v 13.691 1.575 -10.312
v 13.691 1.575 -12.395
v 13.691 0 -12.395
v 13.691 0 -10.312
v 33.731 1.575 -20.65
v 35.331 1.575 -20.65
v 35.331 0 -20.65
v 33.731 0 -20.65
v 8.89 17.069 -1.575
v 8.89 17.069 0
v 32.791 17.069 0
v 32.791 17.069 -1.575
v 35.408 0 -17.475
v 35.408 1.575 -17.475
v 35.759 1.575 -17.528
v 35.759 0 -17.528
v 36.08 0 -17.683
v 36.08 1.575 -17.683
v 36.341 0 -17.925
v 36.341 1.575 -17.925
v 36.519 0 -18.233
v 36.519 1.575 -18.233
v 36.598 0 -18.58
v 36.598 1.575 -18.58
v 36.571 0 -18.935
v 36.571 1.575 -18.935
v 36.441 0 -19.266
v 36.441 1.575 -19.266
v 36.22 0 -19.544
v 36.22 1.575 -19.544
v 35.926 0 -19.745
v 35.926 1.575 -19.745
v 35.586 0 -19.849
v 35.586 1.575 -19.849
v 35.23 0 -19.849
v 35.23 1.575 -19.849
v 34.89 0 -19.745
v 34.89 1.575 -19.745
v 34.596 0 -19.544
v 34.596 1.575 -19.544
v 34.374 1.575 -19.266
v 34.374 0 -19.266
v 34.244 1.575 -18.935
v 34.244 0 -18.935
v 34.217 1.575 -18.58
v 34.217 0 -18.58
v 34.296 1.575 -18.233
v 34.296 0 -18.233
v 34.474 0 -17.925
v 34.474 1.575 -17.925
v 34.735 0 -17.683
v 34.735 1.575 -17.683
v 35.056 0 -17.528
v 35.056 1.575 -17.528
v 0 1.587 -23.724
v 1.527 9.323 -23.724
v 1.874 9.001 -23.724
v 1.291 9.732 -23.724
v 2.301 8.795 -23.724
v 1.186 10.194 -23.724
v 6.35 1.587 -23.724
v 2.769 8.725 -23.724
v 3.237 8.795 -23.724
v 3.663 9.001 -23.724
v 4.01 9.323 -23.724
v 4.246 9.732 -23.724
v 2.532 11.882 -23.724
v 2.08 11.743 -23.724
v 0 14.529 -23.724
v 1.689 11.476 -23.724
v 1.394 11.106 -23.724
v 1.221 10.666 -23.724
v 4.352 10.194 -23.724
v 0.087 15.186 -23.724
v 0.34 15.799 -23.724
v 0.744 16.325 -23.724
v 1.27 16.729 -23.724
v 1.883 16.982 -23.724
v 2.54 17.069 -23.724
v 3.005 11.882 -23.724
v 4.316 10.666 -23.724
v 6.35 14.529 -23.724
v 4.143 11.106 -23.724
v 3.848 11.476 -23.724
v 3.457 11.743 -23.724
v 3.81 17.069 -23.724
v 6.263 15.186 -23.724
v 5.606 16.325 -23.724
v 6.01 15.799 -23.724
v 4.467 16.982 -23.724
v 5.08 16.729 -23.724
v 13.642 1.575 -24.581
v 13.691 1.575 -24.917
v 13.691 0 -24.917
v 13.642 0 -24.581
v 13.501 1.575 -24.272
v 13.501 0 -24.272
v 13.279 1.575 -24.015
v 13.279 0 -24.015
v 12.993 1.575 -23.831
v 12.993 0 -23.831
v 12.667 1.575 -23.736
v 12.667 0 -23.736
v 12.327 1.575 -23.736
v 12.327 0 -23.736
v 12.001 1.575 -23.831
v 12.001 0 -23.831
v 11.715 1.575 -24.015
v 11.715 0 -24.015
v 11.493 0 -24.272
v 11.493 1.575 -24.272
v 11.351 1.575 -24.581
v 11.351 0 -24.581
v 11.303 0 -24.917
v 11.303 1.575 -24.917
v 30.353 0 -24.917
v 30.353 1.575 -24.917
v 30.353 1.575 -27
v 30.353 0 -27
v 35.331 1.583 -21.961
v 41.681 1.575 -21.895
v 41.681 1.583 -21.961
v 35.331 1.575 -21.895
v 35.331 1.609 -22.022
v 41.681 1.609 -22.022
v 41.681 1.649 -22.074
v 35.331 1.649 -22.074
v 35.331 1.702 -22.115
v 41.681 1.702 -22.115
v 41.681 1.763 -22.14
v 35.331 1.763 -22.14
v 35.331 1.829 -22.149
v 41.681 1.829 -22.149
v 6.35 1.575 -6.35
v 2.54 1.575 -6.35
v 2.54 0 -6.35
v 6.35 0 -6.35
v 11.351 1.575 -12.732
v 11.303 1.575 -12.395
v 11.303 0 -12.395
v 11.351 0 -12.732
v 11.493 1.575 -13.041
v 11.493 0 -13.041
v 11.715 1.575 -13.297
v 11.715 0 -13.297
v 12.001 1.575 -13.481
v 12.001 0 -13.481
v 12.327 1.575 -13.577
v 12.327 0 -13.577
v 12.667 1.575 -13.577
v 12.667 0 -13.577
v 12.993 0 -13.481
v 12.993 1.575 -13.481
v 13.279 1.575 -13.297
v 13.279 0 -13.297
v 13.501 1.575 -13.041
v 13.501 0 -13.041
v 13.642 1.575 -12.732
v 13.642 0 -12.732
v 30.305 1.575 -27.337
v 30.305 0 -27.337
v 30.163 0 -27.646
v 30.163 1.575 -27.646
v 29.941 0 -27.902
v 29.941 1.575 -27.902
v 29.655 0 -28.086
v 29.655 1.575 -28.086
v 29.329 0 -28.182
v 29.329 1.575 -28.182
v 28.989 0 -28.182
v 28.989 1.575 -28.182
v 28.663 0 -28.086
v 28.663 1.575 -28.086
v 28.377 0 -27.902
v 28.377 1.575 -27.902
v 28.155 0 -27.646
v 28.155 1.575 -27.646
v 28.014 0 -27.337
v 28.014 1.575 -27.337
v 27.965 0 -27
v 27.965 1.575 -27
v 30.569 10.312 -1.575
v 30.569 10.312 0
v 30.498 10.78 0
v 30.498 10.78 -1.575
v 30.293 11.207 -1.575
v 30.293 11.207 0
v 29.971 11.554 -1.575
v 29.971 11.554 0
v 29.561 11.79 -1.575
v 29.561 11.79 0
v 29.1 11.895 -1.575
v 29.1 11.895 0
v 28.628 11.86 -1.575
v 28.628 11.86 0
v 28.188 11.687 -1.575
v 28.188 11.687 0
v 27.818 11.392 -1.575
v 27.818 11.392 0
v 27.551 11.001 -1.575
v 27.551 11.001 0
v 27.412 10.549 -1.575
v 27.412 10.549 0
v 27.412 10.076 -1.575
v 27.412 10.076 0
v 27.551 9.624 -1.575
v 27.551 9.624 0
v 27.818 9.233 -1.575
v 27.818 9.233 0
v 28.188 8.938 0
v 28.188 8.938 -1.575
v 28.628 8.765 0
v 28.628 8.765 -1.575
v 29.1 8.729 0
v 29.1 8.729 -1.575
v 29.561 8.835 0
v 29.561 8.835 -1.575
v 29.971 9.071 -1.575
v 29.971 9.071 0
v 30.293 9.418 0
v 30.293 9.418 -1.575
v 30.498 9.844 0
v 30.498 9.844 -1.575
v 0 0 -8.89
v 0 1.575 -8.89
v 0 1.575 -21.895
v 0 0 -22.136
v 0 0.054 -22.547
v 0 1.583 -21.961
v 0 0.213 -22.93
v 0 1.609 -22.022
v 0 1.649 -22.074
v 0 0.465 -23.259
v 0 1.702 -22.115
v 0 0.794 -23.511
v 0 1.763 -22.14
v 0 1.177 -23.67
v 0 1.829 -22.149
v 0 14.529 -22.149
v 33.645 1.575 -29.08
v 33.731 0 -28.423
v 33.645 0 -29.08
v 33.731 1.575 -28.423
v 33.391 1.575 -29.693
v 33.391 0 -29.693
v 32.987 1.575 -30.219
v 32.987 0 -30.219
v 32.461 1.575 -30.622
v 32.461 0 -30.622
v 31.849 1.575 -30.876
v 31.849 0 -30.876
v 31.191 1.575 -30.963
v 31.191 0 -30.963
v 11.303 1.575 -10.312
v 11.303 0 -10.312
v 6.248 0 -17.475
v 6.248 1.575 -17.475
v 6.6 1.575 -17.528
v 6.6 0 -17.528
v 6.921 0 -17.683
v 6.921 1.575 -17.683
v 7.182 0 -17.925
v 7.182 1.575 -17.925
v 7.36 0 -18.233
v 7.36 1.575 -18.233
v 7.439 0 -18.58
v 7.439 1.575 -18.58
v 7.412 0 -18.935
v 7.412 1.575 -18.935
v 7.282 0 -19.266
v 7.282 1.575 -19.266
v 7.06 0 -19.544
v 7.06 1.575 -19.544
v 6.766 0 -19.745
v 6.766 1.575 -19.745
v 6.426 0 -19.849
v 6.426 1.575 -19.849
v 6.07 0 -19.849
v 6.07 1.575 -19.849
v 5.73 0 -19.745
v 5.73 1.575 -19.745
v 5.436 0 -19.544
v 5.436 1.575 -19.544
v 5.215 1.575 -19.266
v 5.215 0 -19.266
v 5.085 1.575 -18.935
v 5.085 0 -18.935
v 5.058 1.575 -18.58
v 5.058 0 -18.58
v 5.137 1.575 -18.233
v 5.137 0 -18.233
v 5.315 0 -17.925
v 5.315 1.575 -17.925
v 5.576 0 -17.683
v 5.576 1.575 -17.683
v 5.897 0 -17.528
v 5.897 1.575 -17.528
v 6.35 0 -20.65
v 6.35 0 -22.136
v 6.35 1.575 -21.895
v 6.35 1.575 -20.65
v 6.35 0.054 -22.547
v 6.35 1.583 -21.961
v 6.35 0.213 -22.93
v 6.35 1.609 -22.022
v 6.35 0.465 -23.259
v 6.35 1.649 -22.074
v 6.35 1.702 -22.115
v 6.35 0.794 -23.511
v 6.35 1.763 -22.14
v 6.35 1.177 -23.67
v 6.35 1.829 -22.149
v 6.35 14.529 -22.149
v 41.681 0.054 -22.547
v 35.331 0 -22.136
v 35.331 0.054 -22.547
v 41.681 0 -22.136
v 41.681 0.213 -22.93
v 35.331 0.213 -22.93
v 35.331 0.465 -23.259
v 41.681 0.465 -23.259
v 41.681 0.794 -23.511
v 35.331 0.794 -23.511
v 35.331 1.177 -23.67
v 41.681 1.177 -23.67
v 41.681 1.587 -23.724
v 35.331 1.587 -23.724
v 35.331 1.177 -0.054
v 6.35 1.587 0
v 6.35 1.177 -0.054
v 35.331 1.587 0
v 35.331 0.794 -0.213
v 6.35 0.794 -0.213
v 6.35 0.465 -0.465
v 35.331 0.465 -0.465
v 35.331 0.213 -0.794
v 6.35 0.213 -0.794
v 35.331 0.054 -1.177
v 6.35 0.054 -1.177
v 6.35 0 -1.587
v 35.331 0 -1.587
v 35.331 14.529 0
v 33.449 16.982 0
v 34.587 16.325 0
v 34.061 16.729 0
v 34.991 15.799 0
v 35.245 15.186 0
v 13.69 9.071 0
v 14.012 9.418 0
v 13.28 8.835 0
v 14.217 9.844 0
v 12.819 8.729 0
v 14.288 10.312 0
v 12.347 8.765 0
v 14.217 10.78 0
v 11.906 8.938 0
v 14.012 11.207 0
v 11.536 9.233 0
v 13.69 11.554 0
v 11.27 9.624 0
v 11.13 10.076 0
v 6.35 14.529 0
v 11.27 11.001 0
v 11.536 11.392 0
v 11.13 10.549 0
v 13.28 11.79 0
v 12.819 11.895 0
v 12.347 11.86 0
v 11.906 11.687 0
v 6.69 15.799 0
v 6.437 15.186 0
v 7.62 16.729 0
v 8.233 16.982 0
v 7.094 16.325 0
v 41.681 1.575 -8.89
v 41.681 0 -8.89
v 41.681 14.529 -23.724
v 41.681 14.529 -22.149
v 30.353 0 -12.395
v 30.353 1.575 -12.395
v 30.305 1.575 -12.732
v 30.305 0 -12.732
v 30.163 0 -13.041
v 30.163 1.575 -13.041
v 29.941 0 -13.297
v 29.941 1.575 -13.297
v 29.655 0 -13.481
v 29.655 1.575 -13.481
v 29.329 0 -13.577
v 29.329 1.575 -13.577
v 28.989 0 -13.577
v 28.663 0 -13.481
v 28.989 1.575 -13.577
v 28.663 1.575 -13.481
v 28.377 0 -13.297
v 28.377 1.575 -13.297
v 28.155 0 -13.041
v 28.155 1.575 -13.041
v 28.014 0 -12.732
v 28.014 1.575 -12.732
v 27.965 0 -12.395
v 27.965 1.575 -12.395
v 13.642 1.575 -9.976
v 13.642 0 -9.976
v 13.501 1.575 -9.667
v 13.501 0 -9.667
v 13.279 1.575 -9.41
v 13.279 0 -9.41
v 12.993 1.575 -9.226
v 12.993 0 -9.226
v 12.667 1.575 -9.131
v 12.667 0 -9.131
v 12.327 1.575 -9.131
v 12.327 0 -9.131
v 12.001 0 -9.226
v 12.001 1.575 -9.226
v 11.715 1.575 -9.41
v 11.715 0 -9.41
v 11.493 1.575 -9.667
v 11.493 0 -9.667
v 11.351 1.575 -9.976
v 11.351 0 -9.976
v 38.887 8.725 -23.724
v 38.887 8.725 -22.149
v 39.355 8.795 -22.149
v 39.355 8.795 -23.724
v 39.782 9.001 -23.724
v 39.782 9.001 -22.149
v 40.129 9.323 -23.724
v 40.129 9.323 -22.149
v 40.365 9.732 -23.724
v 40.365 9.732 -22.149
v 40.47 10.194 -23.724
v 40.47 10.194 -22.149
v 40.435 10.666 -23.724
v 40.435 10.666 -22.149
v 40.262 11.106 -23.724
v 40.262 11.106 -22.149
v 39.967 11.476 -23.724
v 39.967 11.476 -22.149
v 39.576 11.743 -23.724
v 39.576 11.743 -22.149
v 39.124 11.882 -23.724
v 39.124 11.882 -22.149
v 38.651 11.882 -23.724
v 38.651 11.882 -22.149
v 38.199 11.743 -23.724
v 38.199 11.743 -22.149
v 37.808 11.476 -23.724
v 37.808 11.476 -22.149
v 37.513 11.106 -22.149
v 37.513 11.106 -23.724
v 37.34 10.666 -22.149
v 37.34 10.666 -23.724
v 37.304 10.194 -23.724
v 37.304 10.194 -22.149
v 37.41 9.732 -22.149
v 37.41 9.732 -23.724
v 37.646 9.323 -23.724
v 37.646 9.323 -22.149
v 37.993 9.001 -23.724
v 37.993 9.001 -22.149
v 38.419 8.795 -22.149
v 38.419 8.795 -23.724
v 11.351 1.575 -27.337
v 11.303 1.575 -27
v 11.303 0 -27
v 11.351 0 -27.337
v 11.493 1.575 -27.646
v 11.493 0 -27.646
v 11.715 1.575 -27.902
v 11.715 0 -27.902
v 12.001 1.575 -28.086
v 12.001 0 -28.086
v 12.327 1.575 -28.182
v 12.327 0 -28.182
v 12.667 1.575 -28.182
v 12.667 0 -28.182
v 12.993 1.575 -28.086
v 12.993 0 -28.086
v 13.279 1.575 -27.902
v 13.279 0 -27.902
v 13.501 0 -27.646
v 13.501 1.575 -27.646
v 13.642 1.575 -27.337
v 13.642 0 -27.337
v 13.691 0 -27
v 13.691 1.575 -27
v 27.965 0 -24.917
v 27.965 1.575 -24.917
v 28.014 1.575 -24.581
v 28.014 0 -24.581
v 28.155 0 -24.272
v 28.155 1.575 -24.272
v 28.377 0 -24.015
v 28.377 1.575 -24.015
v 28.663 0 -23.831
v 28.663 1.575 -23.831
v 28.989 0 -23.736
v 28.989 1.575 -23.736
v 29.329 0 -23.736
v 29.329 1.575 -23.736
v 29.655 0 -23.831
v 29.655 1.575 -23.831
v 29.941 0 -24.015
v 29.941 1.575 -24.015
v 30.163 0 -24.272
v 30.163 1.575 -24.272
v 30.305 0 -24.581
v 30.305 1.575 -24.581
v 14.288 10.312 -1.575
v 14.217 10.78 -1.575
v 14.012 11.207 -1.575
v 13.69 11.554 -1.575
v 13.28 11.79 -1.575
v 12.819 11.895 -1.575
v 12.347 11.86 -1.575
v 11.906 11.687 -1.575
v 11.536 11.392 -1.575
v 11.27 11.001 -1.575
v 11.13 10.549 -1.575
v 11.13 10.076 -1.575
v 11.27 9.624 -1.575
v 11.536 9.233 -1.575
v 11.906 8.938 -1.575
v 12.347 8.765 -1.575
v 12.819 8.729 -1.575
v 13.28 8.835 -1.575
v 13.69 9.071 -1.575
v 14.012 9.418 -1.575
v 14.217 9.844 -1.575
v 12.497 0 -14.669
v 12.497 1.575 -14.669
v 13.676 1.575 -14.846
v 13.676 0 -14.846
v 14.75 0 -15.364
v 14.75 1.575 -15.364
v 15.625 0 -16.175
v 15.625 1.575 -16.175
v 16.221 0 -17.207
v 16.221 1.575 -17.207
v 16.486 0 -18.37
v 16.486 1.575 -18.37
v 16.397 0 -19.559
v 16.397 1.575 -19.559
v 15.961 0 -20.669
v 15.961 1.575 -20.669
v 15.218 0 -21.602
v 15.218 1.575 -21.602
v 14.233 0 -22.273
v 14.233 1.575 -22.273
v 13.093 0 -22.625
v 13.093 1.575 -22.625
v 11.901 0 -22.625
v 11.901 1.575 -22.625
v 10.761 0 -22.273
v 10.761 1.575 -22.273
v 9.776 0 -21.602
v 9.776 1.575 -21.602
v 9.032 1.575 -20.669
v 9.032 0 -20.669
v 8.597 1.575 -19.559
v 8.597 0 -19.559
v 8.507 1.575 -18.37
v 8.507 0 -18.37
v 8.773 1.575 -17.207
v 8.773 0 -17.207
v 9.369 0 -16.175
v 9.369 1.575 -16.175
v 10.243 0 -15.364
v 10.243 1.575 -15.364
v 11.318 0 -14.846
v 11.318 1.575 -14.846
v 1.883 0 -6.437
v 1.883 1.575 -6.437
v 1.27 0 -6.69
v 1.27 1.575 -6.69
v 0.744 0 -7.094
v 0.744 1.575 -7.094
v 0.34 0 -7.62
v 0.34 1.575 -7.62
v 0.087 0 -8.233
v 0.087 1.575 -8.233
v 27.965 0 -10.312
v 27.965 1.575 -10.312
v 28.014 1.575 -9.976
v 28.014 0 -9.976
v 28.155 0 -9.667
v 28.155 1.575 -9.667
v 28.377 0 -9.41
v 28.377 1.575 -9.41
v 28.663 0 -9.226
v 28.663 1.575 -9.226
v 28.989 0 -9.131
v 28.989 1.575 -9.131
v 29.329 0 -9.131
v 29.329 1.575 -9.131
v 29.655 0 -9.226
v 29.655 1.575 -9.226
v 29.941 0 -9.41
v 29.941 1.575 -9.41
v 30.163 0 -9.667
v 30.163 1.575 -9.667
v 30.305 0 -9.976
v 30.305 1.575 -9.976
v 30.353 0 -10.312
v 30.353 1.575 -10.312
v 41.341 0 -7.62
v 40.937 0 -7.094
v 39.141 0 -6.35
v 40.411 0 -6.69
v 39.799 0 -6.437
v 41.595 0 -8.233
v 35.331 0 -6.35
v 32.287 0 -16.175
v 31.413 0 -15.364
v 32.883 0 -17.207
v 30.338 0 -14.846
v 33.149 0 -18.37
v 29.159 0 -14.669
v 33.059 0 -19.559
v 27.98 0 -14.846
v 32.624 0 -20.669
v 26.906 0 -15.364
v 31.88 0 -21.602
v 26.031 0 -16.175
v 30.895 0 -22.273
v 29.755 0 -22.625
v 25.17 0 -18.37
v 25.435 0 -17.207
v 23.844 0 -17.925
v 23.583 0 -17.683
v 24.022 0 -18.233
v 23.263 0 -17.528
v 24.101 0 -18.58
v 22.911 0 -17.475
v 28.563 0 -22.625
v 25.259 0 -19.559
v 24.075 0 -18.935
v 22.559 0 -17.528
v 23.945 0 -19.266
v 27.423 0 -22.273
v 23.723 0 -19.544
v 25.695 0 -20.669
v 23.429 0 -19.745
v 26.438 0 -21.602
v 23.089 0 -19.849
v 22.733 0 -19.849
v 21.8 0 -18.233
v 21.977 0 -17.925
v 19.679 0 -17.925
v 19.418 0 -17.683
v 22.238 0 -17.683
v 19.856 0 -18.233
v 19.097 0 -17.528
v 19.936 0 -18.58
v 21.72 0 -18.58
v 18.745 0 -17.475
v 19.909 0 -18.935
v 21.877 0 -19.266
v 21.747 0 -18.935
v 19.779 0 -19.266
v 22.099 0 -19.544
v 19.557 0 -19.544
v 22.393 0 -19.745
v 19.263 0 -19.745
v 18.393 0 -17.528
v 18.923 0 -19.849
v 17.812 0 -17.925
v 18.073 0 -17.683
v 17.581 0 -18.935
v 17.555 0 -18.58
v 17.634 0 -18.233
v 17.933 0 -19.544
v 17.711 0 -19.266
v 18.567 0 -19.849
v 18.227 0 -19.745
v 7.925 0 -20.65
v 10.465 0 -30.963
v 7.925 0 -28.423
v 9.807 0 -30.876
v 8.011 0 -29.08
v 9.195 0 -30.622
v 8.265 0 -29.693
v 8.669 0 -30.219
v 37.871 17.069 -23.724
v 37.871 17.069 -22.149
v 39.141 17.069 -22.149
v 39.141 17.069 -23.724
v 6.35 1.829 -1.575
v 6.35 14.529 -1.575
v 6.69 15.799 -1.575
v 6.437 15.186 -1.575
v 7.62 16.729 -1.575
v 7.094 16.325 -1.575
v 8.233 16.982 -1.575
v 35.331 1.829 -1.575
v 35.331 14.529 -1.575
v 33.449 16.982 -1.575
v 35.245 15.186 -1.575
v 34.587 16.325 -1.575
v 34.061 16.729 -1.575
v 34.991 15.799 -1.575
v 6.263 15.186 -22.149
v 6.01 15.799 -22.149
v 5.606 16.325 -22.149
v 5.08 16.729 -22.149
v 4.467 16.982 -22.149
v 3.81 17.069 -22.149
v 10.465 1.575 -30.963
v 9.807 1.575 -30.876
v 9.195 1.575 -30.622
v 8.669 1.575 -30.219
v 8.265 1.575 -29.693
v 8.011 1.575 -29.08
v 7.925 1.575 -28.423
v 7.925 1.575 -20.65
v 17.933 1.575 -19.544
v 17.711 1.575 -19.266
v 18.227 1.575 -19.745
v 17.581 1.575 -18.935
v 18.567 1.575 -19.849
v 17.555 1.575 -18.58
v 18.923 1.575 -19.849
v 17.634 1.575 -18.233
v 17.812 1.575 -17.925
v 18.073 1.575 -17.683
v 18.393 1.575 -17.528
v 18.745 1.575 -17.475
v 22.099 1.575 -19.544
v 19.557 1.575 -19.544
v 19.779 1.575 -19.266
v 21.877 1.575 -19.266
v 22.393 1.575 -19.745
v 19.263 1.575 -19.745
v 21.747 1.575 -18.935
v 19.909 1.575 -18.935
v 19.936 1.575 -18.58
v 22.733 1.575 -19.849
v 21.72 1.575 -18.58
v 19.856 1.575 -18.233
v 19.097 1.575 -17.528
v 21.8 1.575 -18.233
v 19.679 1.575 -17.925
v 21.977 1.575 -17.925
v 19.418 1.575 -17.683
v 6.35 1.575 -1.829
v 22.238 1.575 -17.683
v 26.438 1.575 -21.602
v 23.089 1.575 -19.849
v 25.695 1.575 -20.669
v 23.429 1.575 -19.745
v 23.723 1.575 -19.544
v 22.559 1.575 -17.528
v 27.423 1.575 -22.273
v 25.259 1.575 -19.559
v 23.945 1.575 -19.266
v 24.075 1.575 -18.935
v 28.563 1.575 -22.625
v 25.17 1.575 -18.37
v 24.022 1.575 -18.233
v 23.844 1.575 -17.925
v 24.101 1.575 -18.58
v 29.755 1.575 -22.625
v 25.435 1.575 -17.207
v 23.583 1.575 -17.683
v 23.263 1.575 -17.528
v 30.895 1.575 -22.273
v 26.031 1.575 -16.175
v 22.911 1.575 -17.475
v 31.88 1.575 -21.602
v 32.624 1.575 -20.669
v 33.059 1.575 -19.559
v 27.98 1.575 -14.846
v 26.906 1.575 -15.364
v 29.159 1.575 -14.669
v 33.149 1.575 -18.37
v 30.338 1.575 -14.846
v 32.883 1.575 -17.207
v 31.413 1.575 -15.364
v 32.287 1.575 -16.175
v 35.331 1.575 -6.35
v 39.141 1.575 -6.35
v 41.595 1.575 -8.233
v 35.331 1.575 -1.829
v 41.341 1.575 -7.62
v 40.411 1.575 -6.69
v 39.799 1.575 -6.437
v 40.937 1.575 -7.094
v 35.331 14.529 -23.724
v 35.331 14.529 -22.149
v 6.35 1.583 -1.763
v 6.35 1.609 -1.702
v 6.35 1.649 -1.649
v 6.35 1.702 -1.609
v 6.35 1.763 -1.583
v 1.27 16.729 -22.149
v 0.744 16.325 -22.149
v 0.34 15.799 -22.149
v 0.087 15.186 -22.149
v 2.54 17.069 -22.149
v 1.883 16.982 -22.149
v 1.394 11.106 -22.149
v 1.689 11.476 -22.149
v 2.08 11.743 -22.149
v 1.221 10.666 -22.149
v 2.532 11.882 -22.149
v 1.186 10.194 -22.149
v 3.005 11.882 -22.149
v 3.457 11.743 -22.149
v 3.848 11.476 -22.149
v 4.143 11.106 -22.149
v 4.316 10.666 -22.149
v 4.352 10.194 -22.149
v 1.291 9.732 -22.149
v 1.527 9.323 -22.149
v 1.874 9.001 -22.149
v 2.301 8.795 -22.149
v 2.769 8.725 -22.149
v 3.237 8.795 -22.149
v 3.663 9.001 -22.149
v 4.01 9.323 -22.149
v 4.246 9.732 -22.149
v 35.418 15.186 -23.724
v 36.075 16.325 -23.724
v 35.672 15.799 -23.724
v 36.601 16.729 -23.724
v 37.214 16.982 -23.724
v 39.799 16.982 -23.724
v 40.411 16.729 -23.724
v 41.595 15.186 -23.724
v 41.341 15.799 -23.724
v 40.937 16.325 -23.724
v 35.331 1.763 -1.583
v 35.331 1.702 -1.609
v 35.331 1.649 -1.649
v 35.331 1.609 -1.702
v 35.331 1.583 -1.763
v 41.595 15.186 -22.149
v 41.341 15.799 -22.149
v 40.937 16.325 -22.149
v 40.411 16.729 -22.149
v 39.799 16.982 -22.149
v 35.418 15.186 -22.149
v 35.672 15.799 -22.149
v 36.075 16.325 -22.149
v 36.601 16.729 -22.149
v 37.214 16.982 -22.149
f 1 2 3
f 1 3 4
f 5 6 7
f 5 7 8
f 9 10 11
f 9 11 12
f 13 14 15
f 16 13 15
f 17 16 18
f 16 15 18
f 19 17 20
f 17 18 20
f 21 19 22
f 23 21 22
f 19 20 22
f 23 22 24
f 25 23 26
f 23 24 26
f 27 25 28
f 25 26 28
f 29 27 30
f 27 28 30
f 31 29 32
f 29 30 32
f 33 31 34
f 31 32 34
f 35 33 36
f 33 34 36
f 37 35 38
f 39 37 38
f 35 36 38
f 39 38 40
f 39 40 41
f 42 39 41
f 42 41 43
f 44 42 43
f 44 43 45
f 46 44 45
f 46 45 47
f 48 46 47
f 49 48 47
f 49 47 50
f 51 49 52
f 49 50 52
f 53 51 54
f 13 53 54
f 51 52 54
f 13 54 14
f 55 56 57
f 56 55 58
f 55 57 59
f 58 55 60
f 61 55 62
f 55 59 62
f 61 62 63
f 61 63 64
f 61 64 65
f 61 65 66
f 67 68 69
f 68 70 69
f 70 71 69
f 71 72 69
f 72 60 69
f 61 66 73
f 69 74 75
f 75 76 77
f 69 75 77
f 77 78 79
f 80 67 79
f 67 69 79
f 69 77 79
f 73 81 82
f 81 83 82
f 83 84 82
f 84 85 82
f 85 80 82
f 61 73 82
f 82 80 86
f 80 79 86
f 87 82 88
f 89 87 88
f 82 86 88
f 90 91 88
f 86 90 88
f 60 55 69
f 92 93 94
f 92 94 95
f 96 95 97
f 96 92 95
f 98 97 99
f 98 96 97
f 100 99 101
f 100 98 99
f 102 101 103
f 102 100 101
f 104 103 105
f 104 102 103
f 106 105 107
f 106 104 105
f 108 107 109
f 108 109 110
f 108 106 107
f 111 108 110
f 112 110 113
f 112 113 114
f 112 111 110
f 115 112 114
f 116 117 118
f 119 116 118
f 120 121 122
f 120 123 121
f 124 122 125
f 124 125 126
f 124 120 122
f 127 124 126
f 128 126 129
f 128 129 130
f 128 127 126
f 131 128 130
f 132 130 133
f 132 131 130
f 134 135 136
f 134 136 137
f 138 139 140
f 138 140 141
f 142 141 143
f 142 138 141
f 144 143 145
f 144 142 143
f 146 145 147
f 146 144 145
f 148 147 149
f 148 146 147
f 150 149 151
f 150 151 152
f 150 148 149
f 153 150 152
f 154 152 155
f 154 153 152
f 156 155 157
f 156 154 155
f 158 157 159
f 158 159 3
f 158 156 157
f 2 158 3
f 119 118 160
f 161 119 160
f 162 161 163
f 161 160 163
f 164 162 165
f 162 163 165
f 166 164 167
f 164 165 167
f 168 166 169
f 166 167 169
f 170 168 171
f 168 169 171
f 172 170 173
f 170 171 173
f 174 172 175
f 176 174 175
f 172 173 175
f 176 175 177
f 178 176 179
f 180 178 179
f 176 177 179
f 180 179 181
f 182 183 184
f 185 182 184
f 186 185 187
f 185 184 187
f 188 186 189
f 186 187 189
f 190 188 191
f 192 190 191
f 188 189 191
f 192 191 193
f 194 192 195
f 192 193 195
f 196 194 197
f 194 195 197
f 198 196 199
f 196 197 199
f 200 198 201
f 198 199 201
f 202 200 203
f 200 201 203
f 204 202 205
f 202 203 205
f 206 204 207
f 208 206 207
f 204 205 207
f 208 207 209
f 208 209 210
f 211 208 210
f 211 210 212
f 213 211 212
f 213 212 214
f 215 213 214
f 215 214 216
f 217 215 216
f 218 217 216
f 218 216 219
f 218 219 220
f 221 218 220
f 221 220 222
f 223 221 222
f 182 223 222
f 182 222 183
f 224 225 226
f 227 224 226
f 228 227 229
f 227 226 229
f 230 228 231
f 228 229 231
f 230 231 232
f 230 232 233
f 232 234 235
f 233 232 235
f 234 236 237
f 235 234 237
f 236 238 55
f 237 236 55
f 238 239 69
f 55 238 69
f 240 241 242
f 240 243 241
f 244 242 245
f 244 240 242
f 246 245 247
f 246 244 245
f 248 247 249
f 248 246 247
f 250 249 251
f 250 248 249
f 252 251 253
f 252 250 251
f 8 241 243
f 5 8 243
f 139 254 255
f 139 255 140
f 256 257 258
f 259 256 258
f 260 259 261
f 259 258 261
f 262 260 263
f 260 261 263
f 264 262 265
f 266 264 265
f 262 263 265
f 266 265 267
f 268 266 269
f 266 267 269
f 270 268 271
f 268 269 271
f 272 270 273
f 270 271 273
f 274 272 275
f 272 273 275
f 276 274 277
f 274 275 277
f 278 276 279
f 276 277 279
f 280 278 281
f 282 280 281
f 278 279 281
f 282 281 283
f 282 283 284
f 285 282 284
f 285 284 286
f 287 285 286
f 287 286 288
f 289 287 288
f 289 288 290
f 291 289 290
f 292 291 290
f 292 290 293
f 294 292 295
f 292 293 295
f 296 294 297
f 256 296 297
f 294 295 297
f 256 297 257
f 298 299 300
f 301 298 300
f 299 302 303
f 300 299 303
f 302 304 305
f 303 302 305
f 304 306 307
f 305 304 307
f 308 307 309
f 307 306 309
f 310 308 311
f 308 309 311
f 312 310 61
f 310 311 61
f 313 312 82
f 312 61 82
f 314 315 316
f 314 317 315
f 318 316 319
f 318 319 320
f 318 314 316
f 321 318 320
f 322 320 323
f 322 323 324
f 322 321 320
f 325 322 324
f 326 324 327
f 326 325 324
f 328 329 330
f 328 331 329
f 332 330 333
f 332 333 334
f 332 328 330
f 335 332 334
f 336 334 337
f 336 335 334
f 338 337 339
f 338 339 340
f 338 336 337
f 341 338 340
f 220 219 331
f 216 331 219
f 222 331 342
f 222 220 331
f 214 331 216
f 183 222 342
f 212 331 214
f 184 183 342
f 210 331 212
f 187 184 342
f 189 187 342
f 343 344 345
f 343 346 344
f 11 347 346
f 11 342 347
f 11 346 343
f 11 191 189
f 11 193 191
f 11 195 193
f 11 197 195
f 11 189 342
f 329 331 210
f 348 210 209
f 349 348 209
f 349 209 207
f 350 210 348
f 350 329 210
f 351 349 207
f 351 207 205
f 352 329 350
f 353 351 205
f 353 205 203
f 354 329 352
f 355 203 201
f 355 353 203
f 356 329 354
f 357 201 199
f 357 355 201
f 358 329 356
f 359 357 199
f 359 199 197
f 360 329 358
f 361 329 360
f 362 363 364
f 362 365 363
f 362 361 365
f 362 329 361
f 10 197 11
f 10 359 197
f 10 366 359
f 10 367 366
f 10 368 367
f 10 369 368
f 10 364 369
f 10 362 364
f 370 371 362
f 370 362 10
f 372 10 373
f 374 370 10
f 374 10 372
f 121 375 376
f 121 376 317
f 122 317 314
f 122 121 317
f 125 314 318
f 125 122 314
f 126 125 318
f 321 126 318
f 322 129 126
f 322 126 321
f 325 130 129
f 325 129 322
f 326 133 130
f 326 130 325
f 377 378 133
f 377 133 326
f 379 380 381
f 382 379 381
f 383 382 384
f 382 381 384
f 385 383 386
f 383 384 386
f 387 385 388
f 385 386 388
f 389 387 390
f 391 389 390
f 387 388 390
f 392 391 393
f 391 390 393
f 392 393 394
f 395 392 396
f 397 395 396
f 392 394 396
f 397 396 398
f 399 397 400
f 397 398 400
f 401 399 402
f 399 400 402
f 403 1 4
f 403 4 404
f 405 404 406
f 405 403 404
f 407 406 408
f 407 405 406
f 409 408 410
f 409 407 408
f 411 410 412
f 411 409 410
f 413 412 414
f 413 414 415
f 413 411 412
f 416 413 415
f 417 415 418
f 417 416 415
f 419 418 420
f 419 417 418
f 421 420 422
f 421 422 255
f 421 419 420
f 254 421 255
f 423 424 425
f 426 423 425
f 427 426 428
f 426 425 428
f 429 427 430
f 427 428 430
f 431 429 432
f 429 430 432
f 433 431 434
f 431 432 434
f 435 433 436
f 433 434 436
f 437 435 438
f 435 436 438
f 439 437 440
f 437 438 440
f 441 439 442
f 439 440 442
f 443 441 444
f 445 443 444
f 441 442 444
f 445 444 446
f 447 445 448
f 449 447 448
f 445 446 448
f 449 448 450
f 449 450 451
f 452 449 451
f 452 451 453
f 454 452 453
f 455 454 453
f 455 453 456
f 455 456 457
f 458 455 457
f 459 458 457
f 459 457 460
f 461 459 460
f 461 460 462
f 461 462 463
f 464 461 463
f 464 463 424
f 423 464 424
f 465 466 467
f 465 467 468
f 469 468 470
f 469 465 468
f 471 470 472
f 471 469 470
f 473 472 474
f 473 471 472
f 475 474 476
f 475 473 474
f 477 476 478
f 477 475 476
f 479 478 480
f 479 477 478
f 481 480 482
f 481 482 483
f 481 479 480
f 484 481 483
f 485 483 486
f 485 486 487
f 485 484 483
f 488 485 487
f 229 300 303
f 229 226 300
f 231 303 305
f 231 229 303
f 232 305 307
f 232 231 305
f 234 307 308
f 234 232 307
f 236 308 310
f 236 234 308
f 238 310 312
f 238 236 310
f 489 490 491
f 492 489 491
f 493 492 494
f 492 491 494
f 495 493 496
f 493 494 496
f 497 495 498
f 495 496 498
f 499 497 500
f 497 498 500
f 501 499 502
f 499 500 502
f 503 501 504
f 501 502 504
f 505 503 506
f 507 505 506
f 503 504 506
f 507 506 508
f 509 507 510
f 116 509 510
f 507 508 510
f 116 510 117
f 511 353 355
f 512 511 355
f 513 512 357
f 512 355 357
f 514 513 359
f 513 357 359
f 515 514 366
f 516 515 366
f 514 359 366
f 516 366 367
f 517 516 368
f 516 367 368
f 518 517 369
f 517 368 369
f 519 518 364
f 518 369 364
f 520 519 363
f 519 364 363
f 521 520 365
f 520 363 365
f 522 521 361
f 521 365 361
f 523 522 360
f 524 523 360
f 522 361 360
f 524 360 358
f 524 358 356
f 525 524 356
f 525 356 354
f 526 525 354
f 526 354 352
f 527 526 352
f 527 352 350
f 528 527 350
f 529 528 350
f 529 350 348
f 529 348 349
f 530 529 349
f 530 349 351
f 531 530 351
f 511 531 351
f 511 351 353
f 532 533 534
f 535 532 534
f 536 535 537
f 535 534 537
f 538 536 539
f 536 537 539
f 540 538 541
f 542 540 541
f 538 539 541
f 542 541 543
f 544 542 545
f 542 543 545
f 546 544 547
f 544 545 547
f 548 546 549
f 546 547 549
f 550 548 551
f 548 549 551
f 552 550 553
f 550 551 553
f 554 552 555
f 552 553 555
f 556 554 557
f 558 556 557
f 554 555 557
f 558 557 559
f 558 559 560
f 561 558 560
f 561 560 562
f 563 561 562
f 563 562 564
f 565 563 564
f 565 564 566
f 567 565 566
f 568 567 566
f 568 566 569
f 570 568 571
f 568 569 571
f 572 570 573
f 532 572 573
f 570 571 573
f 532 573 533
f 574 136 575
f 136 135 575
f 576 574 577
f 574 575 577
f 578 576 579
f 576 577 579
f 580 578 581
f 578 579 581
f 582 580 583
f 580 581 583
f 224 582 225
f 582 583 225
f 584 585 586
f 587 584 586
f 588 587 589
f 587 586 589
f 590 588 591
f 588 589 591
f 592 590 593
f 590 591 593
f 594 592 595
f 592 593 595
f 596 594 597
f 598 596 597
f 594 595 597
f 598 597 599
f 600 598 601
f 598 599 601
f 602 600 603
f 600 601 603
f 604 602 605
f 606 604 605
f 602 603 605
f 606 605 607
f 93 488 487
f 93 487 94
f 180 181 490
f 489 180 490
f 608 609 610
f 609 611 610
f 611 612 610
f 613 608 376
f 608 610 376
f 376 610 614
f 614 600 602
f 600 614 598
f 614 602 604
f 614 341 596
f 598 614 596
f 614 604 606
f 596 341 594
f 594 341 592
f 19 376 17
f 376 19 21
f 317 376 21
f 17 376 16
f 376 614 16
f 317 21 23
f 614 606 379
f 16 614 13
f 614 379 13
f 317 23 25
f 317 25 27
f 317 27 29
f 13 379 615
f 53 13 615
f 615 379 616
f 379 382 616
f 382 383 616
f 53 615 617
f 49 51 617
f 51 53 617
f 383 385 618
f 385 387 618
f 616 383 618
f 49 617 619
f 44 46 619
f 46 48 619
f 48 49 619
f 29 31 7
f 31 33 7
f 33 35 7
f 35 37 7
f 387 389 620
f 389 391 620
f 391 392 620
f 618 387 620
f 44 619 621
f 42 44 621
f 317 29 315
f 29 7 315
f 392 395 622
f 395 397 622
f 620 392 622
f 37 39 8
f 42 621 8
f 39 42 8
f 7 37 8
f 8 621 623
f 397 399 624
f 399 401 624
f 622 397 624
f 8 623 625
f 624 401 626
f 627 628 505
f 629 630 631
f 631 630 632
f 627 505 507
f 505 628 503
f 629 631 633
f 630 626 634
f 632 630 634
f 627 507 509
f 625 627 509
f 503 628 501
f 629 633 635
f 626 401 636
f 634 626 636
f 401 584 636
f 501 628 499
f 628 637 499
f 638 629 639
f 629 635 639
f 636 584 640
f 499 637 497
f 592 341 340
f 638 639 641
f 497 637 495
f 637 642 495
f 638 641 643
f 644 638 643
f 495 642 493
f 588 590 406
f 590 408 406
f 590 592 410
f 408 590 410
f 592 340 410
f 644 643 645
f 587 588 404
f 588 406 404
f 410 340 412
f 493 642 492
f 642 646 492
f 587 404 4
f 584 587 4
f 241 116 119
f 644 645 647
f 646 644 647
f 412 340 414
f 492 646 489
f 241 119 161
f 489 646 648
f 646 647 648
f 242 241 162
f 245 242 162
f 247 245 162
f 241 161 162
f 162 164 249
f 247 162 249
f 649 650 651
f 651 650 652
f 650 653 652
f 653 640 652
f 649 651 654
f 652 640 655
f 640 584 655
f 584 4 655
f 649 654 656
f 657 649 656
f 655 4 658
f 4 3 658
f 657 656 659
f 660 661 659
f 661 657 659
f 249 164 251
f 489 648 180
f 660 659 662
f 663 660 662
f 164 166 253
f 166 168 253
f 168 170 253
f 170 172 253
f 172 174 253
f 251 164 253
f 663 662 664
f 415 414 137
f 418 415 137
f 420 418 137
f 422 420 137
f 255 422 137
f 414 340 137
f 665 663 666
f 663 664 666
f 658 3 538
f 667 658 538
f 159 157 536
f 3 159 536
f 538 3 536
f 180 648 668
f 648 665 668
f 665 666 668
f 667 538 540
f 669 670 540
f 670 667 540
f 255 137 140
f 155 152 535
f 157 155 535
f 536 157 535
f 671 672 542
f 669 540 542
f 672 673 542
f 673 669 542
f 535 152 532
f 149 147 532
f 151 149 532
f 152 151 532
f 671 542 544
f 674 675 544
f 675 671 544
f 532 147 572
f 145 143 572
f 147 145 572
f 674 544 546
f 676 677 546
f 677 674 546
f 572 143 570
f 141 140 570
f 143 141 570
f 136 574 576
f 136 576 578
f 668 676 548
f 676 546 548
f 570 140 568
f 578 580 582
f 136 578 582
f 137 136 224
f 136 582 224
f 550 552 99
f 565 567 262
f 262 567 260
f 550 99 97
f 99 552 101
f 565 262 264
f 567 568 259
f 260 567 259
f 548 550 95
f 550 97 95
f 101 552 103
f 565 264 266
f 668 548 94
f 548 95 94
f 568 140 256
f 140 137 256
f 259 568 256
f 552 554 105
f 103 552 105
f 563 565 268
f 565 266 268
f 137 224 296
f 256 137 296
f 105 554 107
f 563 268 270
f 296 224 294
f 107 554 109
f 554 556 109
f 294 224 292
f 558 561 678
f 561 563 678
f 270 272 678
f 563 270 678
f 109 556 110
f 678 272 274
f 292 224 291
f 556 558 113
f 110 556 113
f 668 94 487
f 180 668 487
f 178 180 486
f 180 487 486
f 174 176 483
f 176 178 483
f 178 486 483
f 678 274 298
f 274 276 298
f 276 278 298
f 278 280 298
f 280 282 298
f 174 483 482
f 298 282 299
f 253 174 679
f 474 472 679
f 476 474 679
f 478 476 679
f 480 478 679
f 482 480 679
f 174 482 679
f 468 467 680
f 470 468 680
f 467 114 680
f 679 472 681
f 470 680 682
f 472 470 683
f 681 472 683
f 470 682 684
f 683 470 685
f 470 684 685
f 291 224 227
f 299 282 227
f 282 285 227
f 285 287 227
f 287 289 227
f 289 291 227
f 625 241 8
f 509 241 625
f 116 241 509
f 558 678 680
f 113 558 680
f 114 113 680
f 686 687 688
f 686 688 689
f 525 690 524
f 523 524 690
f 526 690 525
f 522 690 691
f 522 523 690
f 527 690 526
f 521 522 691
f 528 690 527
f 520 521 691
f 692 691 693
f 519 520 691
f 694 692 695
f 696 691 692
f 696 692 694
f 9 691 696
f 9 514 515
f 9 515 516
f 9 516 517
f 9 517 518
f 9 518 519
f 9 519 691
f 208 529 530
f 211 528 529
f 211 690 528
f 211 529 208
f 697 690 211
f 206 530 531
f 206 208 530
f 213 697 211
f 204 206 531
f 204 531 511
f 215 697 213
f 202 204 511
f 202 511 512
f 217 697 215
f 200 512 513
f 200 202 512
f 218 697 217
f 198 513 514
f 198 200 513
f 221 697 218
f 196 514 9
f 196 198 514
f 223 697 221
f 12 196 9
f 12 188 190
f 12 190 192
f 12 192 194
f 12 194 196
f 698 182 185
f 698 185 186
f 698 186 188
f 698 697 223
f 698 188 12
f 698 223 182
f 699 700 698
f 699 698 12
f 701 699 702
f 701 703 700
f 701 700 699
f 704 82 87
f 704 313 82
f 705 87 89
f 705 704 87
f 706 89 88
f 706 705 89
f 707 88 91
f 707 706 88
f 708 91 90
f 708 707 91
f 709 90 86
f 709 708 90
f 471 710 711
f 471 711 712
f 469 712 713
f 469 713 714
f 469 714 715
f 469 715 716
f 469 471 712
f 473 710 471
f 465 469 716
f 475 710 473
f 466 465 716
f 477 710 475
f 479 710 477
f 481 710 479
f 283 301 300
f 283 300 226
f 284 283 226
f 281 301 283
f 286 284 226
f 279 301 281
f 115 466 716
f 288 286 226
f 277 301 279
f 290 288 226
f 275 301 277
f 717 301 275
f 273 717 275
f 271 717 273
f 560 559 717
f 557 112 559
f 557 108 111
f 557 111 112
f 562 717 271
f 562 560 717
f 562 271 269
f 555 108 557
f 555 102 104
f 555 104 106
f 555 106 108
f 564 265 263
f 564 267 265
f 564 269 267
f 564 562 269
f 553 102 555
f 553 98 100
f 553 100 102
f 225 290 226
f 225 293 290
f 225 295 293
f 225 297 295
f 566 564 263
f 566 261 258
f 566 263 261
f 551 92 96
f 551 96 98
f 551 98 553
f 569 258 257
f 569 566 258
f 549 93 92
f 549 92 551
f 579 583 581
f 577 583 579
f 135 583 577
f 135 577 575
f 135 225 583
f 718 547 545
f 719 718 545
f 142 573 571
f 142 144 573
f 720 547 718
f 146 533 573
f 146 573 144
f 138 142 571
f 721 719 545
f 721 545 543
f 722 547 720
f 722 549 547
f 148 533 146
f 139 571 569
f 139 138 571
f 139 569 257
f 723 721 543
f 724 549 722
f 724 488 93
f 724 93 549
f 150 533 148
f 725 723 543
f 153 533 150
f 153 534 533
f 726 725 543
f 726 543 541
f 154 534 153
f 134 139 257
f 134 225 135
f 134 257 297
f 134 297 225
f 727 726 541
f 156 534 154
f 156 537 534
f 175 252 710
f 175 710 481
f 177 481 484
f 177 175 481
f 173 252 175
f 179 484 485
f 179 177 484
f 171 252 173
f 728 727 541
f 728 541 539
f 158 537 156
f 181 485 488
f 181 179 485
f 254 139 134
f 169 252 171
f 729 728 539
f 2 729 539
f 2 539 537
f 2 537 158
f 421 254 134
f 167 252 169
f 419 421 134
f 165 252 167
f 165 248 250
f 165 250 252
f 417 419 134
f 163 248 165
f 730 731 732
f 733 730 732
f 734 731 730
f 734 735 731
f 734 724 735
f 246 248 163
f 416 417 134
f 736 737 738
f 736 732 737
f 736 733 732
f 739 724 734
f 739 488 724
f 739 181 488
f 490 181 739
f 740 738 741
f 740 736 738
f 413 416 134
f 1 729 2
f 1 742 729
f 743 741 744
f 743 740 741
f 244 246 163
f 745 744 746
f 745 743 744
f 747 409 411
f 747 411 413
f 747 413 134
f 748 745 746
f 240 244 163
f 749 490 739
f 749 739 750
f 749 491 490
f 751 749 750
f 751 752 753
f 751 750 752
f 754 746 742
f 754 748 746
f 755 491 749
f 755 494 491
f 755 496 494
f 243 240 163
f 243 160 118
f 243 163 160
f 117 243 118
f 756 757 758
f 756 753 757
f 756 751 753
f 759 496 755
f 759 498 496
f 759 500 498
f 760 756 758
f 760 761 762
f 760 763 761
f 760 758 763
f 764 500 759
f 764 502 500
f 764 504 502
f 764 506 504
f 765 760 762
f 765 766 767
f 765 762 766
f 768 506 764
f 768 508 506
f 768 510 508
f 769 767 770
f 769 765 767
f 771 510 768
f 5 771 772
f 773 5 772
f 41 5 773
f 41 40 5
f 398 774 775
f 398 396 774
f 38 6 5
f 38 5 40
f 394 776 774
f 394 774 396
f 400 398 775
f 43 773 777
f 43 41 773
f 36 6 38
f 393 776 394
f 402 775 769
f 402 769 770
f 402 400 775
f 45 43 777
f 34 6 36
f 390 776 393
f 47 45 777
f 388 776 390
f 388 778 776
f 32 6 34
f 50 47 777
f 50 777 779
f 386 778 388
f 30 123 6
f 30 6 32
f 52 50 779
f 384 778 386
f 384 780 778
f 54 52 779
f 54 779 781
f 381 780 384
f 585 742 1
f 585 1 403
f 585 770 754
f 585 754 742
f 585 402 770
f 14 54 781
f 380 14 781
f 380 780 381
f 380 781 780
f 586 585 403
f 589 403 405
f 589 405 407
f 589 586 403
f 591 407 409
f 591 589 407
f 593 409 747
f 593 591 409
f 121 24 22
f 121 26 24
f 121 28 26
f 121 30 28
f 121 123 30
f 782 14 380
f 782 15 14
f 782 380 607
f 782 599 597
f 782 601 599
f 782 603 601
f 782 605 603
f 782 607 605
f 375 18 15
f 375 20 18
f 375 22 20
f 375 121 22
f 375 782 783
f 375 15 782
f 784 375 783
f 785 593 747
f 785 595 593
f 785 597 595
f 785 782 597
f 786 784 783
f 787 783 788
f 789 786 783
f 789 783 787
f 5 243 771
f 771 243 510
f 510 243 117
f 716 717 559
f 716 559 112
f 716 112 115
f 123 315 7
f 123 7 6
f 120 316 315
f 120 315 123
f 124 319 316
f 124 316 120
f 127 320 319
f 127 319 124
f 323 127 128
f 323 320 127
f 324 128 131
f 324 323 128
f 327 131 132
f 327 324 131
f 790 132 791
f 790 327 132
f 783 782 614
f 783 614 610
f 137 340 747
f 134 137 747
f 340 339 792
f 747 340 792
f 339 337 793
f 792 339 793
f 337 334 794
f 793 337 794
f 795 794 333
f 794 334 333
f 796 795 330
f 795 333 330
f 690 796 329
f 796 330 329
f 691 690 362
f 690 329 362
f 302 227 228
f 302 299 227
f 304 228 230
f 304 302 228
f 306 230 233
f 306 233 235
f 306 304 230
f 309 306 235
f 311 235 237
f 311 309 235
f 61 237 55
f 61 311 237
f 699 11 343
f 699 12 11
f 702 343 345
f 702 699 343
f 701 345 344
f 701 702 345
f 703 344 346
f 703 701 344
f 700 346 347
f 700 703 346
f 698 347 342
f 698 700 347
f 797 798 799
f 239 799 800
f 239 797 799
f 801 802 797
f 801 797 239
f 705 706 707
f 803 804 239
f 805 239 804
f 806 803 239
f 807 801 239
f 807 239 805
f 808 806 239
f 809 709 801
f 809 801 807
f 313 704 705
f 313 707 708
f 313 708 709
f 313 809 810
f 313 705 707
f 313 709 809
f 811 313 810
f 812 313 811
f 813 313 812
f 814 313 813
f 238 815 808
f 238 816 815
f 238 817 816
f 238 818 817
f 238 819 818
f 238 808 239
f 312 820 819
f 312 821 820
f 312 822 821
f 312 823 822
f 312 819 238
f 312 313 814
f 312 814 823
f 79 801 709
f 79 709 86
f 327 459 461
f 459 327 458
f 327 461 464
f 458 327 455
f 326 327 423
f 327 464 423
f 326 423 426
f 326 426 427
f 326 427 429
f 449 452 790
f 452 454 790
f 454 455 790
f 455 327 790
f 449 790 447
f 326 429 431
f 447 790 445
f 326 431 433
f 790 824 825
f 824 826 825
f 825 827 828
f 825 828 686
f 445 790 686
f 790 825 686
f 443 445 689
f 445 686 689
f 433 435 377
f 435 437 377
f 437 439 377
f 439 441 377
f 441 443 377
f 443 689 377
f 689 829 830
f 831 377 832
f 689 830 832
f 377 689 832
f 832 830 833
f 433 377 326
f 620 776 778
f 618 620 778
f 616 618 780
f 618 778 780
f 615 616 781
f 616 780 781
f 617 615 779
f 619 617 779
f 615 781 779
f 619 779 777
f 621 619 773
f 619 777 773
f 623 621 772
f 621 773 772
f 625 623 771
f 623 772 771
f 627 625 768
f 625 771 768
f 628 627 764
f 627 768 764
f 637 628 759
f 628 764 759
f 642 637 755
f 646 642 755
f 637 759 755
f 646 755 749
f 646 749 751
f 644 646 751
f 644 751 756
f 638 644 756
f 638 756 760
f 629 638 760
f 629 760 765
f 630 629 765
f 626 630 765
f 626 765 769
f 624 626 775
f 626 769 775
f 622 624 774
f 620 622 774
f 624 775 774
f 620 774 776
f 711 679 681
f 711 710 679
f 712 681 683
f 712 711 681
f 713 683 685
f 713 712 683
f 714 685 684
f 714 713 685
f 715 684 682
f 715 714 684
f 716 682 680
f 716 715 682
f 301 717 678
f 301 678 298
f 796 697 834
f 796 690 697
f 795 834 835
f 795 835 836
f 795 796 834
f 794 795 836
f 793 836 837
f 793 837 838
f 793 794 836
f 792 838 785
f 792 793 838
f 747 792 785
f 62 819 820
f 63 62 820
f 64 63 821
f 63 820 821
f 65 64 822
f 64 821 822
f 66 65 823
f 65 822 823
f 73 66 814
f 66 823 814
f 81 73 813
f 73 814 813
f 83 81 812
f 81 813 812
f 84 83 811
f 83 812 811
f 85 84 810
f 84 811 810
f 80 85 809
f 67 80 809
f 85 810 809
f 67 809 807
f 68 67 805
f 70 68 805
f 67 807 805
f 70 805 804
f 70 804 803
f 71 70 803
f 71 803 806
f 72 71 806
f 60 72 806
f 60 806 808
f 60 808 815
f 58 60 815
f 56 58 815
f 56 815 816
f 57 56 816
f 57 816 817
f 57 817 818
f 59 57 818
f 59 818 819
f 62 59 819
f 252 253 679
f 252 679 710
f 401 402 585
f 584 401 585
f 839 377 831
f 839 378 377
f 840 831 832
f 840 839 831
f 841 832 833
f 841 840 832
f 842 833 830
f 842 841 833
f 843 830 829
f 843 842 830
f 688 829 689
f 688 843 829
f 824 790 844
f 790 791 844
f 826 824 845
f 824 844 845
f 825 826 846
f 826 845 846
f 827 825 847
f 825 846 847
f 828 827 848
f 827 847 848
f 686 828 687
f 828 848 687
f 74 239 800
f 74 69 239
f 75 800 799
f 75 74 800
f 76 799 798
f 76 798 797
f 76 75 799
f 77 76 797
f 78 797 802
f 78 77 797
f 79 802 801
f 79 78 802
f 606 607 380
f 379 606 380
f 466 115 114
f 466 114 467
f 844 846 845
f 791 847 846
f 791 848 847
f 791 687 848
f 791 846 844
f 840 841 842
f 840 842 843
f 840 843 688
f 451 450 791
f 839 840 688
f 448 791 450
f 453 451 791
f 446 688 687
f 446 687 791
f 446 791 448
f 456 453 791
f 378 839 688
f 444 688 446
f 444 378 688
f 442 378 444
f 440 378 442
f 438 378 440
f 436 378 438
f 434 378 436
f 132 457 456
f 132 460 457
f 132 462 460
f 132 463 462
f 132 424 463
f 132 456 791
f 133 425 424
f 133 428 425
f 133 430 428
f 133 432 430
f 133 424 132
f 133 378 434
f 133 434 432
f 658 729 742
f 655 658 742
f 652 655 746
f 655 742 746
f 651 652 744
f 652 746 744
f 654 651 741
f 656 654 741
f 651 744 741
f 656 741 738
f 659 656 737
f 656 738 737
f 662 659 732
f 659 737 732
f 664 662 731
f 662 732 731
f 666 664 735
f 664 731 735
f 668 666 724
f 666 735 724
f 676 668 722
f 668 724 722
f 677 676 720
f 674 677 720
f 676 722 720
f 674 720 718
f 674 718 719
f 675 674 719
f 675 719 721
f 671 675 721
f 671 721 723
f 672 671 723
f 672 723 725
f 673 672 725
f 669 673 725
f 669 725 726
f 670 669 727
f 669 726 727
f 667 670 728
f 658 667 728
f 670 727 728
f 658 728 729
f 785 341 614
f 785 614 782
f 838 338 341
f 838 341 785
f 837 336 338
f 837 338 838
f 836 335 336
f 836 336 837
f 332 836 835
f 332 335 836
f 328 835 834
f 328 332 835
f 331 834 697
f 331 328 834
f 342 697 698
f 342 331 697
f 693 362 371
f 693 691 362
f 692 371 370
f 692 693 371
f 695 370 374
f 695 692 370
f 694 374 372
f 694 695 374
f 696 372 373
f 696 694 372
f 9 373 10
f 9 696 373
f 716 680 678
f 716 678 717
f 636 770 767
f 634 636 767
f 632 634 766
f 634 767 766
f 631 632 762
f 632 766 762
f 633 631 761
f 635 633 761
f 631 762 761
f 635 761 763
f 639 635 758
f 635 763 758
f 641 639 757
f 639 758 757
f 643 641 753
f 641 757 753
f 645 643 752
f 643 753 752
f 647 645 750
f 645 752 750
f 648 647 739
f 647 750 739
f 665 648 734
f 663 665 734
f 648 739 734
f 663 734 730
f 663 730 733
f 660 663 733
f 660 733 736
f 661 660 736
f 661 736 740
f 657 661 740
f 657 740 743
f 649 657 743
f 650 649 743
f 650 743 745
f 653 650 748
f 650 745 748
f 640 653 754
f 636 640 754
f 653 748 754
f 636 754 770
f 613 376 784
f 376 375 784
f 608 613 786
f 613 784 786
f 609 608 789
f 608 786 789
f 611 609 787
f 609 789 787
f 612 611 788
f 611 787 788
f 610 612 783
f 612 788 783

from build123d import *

# Parameters (mm, degrees)
SKETCH1_W         = 30.9626
SKETCH1_H         = 17.0688
EXTRUDE1_DEPTH    = 41.6814
SKETCH3_OUTSIDE_W = 43.895
SKETCH3_OUTSIDE_H = 30.001
EXTRUDE2_DEPTH    = 42.6814
SKETCH4_W         = 6.35
SKETCH4_H         = 17.0688
EXTRUDE3_DEPTH    = 6.35
SKETCH5_W         = 6.35
SKETCH5_H         = 7.239
EXTRUDE4_DEPTH    = 1.5748
SKETCH6_W         = 28.9814
SKETCH6_H         = 15.494
EXTRUDE5_DEPTH    = 1.5748
SKETCH7_W         = 1.6002
SKETCH7_H         = 1.5748
SKETCH7_W_2       = 1.5748
EXTRUDE6_DEPTH    = 10.3124
FILLET1_R         = 1.5875
FILLET2_R         = 0.254
SKETCH8_R         = 4.0005
SKETCH8_R_2       = 1.1938
EXTRUDE7_DEPTH    = 1.5748
SKETCH9_R         = 1.5875
EXTRUDE9_DEPTH    = 31.9626
FILLET3_R         = 2.54


with BuildPart() as part:
    # Sketch1 → Extrude1 (new body)
    with BuildSketch(Plane(origin=(0, 0, 0), x_dir=(0, 0, -1), z_dir=(1, 0, 0))):
        with Locations((15.4813, 8.5344)):
            Rectangle(SKETCH1_W, SKETCH1_H)
    extrude(amount=EXTRUDE1_DEPTH)

    # Sketch3 outside → Extrude2 (cut, through all)
    with BuildSketch(Plane(origin=(41.6814, 0, 0), x_dir=(0, 0, -1), z_dir=(1, 0, 0))):
        with Locations((15.4815, 8.5345)):
            Rectangle(SKETCH3_OUTSIDE_W, SKETCH3_OUTSIDE_H)
        Polygon((0, 17.0688), (0, 0), (30.9626, 0), (30.9626, 1.5748), (23.7236, 1.5748), (23.7236, 17.0688), (22.1488, 17.0688), (22.1488, 1.5748), (1.5748, 1.5748), (1.5748, 17.0688), align=None, mode=Mode.SUBTRACT)
    extrude(amount=-EXTRUDE2_DEPTH, mode=Mode.SUBTRACT)

    # Sketch4 → Extrude3 (cut)
    with BuildSketch(Plane.XY):
        with Locations((3.175, 8.5344)):
            Rectangle(SKETCH4_W, SKETCH4_H)
        with Locations((38.5064, 8.5344)):
            Rectangle(SKETCH4_W, SKETCH4_H)
    extrude(amount=-EXTRUDE3_DEPTH, mode=Mode.SUBTRACT)

    # Sketch5 → Extrude4 (cut)
    with BuildSketch(Plane(origin=(0, 1.5748, 0), x_dir=(1, 0, 0), z_dir=(0, 1, 0))):
        with Locations((3.175, 27.3431)):
            Rectangle(SKETCH5_W, SKETCH5_H)
        with Locations((38.5064, 27.3431)):
            Rectangle(SKETCH5_W, SKETCH5_H)
    extrude(amount=-EXTRUDE4_DEPTH, mode=Mode.SUBTRACT)

    # Sketch6 → Extrude5 (cut)
    with BuildSketch(Plane(origin=(0, 0, -23.7236), x_dir=(-1, 0, 0), z_dir=(0, 0, -1))):
        with Locations((-20.8407, 9.3218)):
            Rectangle(SKETCH6_W, SKETCH6_H)
    extrude(amount=-EXTRUDE5_DEPTH, mode=Mode.SUBTRACT)

    # Sketch7 → Extrude6 (cut)
    with BuildSketch(Plane(origin=(0, 0, -30.9626), x_dir=(-1, 0, 0), z_dir=(0, 0, -1))):
        with Locations((-34.5313, 0.7874)):
            Rectangle(SKETCH7_W, SKETCH7_H)
        with Locations((-7.1374, 0.7874)):
            Rectangle(SKETCH7_W_2, SKETCH7_H)
    extrude(amount=-EXTRUDE6_DEPTH, mode=Mode.SUBTRACT)

    # Fillet1
    fillet1_edges = [part.edges().sort_by_distance(p)[0] for p in [
        (3.175, 0, -23.7236),
        (38.5064, 0, -23.7236),
        (20.8407, 0, 0),
    ]]
    fillet(fillet1_edges, radius=FILLET1_R)

    # Fillet2
    fillet2_edges = [part.edges().sort_by_distance(p)[0] for p in [
        (38.5064, 1.5748, -22.1488),
        (3.175, 1.5748, -22.1488),
        (20.8407, 1.5748, -1.5748),
    ]]
    fillet(fillet2_edges, radius=FILLET2_R)

    # Sketch8 → Extrude7 (cut)
    with BuildSketch(Plane(origin=(0, 1.5748, 0), x_dir=(1, 0, 0), z_dir=(0, 1, 0))):
        with Locations(Location((12.4968, 18.669, 0), (0, 0, 270))):  # turned: the seam where the file's is
            Circle(SKETCH8_R)
        with Locations(Location((18.7452, 18.669, 0), (0, 0, 270))):  # turned: the seam where the file's is
            Circle(SKETCH8_R_2)
        with Locations(Location((6.2484, 18.669, 0), (0, 0, 270))):  # turned: the seam where the file's is
            Circle(SKETCH8_R_2)
        with Locations(Location((22.9108, 18.669, 0), (0, 0, 270))):  # turned: the seam where the file's is
            Circle(SKETCH8_R_2)
        with Locations(Location((29.1592, 18.669, 0), (0, 0, 270))):  # turned: the seam where the file's is
            Circle(SKETCH8_R)
        with Locations(Location((35.4076, 18.669, 0), (0, 0, 270))):  # turned: the seam where the file's is
            Circle(SKETCH8_R_2)
        with BuildLine():
            Line((13.6906, 27.0002), (13.6906, 24.9174))
            ThreePointArc((13.6906, 24.9174), (12.4968, 23.7236), (11.303, 24.9174))
            Line((11.303, 24.9174), (11.303, 27.0002))
            ThreePointArc((11.303, 27.0002), (12.4968, 28.194), (13.6906, 27.0002))
        make_face()
        with BuildLine():
            Line((13.6906, 12.3952), (13.6906, 10.3124))
            ThreePointArc((13.6906, 10.3124), (12.4968, 9.1186), (11.303, 10.3124))
            Line((11.303, 10.3124), (11.303, 12.3952))
            ThreePointArc((11.303, 12.3952), (12.4968, 13.589), (13.6906, 12.3952))
        make_face()
        with BuildLine():
            Line((27.9654, 12.3952), (27.9654, 10.3124))
            ThreePointArc((27.9654, 10.3124), (29.1592, 9.1186), (30.353, 10.3124))
            Line((30.353, 10.3124), (30.353, 12.3952))
            ThreePointArc((30.353, 12.3952), (29.1592, 13.589), (27.9654, 12.3952))
        make_face()
        with BuildLine():
            Line((27.9654, 27.0002), (27.9654, 24.9174))
            ThreePointArc((27.9654, 24.9174), (29.1592, 23.7236), (30.353, 24.9174))
            Line((30.353, 24.9174), (30.353, 27.0002))
            ThreePointArc((30.353, 27.0002), (29.1592, 28.194), (27.9654, 27.0002))
        make_face()
    extrude(amount=-EXTRUDE7_DEPTH, mode=Mode.SUBTRACT)

    # Sketch9 → Extrude9 (cut, through all)
    with BuildSketch(Plane.XY):
        with Locations(Location((2.7686, 10.3124, 0), (0, 0, 270))):  # turned: the seam where the file's is
            Circle(SKETCH9_R)
        with Locations((12.7, 10.3124)):
            Circle(SKETCH9_R)
        with Locations((28.9814, 10.3124)):
            Circle(SKETCH9_R)
        with Locations(Location((38.8874, 10.3124, 0), (0, 0, 270))):  # turned: the seam where the file's is
            Circle(SKETCH9_R)
    extrude(amount=-EXTRUDE9_DEPTH, mode=Mode.SUBTRACT)

    # Fillet3
    fillet3_edges = [part.edges().sort_by_distance(p)[0] for p in [
        (6.35, 17.0688, -22.9362),
        (35.3314, 17.0688, -22.9362),
        (0, 17.0688, -22.9362),
        (33.7312, 0.7874, -30.9626),
        (7.9248, 0.7874, -30.9626),
        (41.6814, 17.0688, -22.9362),
        (0, 0.7874, -6.35),
        (6.35, 17.0688, -0.7874),
        (35.3314, 17.0688, -0.7874),
        (41.6814, 0.7874, -6.35),
    ]]
    fillet(fillet3_edges, radius=FILLET3_R)


solid = part.part
